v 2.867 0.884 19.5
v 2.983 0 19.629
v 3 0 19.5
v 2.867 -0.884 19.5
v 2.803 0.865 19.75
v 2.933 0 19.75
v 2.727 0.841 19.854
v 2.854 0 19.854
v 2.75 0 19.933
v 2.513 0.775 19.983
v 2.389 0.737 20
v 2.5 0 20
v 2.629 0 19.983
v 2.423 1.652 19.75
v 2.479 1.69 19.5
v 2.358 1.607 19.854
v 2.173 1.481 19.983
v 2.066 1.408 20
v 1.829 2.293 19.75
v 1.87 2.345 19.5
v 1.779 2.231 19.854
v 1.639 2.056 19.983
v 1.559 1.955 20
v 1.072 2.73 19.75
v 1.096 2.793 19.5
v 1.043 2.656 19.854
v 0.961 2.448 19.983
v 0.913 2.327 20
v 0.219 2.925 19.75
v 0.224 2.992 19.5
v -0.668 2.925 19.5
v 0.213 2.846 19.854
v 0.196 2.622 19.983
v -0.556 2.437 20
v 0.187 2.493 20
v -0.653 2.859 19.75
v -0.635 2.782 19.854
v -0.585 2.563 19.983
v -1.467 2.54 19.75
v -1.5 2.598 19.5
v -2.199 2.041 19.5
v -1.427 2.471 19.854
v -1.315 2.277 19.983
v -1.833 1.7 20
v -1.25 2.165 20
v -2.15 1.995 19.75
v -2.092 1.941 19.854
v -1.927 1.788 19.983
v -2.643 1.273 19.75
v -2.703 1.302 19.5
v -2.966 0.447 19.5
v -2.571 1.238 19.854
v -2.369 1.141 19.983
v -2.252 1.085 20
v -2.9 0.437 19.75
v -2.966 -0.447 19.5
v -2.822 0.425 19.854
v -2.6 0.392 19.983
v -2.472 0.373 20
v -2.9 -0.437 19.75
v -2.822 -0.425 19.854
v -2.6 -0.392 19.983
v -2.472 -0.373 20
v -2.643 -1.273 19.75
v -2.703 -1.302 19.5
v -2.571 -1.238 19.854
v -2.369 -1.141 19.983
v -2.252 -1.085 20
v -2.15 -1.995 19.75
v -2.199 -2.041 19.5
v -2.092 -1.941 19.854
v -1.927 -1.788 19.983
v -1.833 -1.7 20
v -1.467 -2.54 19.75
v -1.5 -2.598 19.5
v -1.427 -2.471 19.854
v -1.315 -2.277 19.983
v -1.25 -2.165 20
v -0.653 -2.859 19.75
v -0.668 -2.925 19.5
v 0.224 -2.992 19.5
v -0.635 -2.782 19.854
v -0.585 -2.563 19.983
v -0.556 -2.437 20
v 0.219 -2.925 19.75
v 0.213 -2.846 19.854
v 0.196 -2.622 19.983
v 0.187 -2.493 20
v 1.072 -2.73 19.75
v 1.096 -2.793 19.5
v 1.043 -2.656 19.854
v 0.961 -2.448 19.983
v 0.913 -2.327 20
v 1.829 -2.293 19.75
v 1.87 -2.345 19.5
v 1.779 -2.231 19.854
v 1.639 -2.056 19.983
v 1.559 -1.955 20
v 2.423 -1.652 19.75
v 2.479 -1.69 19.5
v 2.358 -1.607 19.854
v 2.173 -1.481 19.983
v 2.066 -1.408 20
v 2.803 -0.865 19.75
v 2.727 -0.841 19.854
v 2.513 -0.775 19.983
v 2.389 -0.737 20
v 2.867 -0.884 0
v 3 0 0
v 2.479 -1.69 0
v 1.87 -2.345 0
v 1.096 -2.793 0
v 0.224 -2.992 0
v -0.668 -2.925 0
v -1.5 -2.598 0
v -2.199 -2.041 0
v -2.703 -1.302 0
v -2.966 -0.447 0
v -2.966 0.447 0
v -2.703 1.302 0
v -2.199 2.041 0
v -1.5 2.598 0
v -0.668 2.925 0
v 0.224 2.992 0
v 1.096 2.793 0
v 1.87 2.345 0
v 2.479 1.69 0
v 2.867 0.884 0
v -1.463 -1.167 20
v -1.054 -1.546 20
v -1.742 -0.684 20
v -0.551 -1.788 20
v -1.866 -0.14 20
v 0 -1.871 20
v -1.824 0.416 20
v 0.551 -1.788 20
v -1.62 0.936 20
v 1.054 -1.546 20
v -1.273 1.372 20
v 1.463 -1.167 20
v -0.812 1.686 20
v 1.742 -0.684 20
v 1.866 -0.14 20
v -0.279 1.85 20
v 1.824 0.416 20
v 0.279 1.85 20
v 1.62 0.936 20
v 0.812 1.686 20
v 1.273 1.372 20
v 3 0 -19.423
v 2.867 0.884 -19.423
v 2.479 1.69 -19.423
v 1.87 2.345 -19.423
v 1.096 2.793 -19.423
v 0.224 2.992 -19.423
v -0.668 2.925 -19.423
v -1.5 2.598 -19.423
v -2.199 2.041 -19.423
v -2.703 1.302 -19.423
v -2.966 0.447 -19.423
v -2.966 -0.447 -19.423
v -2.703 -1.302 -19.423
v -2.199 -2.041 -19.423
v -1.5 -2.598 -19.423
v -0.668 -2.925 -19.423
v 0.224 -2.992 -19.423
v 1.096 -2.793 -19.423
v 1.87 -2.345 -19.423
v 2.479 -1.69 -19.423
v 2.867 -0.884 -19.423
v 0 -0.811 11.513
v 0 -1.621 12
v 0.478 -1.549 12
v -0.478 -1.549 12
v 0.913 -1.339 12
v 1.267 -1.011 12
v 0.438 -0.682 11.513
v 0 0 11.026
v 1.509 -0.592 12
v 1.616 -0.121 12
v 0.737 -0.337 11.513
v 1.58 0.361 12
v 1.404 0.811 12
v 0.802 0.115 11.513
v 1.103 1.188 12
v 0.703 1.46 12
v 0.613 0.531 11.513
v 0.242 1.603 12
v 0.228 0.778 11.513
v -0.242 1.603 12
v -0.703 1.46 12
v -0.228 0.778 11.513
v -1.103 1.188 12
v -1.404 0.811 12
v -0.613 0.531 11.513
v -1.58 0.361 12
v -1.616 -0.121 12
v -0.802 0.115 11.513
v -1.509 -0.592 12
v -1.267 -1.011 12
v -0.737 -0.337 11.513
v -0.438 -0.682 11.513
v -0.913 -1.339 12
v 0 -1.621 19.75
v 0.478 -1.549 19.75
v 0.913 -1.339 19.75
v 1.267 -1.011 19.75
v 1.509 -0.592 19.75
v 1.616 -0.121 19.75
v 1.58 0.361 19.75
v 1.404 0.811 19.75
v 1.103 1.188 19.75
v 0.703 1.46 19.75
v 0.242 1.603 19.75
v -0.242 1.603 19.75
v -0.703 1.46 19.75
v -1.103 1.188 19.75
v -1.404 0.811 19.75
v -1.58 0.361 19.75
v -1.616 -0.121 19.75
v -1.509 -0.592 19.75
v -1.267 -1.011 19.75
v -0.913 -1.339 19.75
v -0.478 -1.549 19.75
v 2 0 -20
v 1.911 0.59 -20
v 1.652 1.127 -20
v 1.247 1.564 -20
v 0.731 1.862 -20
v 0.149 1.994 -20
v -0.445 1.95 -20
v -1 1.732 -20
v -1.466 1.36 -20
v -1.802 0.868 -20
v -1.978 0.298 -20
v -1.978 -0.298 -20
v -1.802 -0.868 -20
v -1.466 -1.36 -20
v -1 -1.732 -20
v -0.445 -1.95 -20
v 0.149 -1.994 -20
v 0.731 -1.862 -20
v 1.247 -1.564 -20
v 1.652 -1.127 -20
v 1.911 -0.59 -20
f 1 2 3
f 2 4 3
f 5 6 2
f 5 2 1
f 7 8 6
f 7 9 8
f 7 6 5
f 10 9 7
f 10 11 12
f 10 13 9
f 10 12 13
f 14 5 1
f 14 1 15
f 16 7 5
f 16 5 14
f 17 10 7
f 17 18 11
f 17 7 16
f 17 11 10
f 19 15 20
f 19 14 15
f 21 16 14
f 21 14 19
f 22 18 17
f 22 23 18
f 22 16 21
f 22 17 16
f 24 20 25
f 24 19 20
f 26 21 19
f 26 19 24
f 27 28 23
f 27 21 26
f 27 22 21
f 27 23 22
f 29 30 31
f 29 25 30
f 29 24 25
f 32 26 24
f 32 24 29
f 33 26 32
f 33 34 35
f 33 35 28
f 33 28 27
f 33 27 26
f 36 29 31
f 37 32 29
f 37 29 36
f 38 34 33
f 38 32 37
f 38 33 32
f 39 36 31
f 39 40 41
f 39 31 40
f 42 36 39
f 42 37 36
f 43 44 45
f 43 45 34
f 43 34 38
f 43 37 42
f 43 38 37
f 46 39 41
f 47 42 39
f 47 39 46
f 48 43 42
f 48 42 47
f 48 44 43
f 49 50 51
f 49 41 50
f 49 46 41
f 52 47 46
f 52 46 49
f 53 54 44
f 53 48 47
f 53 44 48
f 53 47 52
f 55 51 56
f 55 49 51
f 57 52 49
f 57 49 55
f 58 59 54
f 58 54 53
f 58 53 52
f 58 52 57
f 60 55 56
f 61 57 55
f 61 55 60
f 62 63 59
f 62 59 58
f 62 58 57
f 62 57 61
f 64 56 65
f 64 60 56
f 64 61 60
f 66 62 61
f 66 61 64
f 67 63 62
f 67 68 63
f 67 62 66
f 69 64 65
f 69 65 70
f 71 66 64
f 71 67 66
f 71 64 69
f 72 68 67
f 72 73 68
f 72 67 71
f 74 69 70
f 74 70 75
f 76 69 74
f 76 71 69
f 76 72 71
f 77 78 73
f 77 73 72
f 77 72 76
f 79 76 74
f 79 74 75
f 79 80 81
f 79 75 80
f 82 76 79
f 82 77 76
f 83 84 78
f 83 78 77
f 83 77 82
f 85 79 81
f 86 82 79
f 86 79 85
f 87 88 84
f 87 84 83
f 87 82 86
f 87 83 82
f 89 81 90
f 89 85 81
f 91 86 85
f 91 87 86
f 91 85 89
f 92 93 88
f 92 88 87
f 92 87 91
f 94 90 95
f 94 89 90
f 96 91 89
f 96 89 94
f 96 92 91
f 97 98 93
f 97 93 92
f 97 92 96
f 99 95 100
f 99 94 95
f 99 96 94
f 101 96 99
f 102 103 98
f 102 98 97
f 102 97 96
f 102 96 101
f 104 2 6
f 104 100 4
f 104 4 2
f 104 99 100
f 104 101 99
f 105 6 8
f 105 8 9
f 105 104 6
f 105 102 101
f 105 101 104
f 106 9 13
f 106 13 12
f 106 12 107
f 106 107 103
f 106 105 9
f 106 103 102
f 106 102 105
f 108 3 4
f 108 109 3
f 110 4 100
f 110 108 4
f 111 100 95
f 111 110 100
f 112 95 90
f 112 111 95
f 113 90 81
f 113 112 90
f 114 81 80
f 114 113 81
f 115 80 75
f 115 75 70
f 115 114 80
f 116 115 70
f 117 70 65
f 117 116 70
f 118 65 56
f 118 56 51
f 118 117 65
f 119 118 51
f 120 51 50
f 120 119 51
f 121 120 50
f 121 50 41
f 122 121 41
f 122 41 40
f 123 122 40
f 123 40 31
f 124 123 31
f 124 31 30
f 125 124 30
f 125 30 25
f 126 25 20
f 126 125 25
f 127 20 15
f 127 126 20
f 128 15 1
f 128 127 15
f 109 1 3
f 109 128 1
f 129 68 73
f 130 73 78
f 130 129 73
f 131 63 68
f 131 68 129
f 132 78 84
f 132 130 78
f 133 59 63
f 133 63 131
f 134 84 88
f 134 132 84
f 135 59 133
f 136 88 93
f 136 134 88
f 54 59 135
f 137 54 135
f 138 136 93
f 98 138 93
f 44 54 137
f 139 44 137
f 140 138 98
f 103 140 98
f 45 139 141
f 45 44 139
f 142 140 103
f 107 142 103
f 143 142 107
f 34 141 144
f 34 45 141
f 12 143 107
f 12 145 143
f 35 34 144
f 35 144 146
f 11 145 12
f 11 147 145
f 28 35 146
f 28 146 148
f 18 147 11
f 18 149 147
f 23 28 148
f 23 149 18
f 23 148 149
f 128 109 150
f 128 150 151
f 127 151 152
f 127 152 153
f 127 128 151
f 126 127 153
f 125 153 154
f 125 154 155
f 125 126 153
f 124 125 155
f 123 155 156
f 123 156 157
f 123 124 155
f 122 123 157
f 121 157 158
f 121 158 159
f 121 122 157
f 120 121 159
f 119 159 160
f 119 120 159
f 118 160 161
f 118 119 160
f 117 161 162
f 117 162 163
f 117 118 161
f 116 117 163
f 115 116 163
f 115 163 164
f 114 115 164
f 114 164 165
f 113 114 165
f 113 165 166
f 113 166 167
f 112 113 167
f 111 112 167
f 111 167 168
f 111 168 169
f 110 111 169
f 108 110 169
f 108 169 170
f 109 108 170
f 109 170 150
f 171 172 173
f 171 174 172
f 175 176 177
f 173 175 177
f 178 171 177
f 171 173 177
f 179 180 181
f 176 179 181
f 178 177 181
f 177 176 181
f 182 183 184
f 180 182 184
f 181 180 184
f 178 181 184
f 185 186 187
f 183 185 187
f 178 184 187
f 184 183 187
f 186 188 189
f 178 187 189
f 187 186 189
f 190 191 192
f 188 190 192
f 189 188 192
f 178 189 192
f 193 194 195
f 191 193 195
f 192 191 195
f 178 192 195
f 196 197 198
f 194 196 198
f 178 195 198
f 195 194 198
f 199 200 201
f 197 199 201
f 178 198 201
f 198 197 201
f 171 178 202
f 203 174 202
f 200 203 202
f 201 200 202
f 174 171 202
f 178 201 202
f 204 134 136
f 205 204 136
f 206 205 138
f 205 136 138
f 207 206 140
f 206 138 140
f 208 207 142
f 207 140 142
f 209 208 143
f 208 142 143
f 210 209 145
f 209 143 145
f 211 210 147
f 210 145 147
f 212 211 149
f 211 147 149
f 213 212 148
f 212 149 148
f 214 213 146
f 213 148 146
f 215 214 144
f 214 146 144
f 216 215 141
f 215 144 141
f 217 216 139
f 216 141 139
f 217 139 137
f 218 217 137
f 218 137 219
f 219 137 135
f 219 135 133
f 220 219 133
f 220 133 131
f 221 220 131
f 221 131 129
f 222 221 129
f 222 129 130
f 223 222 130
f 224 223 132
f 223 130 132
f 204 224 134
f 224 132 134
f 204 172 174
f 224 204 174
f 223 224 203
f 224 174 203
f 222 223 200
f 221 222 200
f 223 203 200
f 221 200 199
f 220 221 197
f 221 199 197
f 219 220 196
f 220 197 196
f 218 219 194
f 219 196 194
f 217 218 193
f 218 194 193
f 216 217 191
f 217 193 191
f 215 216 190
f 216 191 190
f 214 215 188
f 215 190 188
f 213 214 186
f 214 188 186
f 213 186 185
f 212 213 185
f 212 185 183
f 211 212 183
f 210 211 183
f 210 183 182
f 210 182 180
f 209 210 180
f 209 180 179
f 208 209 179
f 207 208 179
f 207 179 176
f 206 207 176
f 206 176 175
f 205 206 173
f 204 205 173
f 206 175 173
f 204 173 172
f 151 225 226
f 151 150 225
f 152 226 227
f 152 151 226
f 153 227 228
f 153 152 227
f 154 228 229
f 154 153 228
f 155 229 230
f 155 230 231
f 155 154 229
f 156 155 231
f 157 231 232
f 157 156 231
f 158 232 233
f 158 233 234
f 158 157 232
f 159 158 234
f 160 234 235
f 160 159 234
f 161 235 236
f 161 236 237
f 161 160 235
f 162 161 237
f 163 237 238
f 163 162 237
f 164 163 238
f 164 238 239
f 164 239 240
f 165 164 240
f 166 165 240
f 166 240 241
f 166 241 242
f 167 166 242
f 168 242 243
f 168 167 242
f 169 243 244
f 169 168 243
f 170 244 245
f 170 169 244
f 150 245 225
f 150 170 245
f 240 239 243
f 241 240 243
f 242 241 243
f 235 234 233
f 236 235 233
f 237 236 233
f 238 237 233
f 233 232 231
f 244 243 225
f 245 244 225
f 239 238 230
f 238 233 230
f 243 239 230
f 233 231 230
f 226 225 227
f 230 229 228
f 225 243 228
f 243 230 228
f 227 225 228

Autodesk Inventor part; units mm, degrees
ref_plane "YZ Plane" through (0, 0, 0) normal (1, 0, 0) x (0, 1, 0)
ref_plane "XZ Plane" through (0, 0, 0) normal (0, 1, 0) x (-1, 0, 0)
ref_plane "XY Plane" through (0, 0, 0) normal (0, 0, 1) x (1, 0, 0)
sketch "Sketch1" plane through (0, 0, 0) normal (0, 0, 1) x (1, 0, 0)
  line L0 (0, 4.2) -> (0, -4.2) projected
  line L1 (-4.2, 0) -> (4.2, 0) projected
  circle A0 centre (0, 0) radius 3
  dimension "d0" = 6
extrude "Extrusion1" add sketch "Sketch1" along normal mid plane 40
chamfer "Chamfer1" distance 1 angle 30 1 edges at (-3, 0, -20) measured on face at (-0.5351, 1.0949, -20)
fillet "Fillet1" radius 0.5 1 edges at (-3, 0, 20)
sketch "Sketch2" plane through (0, 0, 20) normal (0, 0, 1) x (1, 0, 0)
  circle A0 centre (0, 0) radius 2.5 projected
hole "Hole1" at (0, 0, 20) direction (0, 0, -1) diameter 3.242 depth 8 tip angle 118 thread size "M4x0.7" class "6H" standard "ANSI Metric M Profile"
chamfer "Chamfer2" distance 0.25 angle 45 1 edges at (0, 1.621, 20)
properties part number "PIN, DOWEL, PULL, 6MMODX40MM" material "Steel, 4140, Carb & Case Harden 58-60 Rc, 0.06 Dp Case"
